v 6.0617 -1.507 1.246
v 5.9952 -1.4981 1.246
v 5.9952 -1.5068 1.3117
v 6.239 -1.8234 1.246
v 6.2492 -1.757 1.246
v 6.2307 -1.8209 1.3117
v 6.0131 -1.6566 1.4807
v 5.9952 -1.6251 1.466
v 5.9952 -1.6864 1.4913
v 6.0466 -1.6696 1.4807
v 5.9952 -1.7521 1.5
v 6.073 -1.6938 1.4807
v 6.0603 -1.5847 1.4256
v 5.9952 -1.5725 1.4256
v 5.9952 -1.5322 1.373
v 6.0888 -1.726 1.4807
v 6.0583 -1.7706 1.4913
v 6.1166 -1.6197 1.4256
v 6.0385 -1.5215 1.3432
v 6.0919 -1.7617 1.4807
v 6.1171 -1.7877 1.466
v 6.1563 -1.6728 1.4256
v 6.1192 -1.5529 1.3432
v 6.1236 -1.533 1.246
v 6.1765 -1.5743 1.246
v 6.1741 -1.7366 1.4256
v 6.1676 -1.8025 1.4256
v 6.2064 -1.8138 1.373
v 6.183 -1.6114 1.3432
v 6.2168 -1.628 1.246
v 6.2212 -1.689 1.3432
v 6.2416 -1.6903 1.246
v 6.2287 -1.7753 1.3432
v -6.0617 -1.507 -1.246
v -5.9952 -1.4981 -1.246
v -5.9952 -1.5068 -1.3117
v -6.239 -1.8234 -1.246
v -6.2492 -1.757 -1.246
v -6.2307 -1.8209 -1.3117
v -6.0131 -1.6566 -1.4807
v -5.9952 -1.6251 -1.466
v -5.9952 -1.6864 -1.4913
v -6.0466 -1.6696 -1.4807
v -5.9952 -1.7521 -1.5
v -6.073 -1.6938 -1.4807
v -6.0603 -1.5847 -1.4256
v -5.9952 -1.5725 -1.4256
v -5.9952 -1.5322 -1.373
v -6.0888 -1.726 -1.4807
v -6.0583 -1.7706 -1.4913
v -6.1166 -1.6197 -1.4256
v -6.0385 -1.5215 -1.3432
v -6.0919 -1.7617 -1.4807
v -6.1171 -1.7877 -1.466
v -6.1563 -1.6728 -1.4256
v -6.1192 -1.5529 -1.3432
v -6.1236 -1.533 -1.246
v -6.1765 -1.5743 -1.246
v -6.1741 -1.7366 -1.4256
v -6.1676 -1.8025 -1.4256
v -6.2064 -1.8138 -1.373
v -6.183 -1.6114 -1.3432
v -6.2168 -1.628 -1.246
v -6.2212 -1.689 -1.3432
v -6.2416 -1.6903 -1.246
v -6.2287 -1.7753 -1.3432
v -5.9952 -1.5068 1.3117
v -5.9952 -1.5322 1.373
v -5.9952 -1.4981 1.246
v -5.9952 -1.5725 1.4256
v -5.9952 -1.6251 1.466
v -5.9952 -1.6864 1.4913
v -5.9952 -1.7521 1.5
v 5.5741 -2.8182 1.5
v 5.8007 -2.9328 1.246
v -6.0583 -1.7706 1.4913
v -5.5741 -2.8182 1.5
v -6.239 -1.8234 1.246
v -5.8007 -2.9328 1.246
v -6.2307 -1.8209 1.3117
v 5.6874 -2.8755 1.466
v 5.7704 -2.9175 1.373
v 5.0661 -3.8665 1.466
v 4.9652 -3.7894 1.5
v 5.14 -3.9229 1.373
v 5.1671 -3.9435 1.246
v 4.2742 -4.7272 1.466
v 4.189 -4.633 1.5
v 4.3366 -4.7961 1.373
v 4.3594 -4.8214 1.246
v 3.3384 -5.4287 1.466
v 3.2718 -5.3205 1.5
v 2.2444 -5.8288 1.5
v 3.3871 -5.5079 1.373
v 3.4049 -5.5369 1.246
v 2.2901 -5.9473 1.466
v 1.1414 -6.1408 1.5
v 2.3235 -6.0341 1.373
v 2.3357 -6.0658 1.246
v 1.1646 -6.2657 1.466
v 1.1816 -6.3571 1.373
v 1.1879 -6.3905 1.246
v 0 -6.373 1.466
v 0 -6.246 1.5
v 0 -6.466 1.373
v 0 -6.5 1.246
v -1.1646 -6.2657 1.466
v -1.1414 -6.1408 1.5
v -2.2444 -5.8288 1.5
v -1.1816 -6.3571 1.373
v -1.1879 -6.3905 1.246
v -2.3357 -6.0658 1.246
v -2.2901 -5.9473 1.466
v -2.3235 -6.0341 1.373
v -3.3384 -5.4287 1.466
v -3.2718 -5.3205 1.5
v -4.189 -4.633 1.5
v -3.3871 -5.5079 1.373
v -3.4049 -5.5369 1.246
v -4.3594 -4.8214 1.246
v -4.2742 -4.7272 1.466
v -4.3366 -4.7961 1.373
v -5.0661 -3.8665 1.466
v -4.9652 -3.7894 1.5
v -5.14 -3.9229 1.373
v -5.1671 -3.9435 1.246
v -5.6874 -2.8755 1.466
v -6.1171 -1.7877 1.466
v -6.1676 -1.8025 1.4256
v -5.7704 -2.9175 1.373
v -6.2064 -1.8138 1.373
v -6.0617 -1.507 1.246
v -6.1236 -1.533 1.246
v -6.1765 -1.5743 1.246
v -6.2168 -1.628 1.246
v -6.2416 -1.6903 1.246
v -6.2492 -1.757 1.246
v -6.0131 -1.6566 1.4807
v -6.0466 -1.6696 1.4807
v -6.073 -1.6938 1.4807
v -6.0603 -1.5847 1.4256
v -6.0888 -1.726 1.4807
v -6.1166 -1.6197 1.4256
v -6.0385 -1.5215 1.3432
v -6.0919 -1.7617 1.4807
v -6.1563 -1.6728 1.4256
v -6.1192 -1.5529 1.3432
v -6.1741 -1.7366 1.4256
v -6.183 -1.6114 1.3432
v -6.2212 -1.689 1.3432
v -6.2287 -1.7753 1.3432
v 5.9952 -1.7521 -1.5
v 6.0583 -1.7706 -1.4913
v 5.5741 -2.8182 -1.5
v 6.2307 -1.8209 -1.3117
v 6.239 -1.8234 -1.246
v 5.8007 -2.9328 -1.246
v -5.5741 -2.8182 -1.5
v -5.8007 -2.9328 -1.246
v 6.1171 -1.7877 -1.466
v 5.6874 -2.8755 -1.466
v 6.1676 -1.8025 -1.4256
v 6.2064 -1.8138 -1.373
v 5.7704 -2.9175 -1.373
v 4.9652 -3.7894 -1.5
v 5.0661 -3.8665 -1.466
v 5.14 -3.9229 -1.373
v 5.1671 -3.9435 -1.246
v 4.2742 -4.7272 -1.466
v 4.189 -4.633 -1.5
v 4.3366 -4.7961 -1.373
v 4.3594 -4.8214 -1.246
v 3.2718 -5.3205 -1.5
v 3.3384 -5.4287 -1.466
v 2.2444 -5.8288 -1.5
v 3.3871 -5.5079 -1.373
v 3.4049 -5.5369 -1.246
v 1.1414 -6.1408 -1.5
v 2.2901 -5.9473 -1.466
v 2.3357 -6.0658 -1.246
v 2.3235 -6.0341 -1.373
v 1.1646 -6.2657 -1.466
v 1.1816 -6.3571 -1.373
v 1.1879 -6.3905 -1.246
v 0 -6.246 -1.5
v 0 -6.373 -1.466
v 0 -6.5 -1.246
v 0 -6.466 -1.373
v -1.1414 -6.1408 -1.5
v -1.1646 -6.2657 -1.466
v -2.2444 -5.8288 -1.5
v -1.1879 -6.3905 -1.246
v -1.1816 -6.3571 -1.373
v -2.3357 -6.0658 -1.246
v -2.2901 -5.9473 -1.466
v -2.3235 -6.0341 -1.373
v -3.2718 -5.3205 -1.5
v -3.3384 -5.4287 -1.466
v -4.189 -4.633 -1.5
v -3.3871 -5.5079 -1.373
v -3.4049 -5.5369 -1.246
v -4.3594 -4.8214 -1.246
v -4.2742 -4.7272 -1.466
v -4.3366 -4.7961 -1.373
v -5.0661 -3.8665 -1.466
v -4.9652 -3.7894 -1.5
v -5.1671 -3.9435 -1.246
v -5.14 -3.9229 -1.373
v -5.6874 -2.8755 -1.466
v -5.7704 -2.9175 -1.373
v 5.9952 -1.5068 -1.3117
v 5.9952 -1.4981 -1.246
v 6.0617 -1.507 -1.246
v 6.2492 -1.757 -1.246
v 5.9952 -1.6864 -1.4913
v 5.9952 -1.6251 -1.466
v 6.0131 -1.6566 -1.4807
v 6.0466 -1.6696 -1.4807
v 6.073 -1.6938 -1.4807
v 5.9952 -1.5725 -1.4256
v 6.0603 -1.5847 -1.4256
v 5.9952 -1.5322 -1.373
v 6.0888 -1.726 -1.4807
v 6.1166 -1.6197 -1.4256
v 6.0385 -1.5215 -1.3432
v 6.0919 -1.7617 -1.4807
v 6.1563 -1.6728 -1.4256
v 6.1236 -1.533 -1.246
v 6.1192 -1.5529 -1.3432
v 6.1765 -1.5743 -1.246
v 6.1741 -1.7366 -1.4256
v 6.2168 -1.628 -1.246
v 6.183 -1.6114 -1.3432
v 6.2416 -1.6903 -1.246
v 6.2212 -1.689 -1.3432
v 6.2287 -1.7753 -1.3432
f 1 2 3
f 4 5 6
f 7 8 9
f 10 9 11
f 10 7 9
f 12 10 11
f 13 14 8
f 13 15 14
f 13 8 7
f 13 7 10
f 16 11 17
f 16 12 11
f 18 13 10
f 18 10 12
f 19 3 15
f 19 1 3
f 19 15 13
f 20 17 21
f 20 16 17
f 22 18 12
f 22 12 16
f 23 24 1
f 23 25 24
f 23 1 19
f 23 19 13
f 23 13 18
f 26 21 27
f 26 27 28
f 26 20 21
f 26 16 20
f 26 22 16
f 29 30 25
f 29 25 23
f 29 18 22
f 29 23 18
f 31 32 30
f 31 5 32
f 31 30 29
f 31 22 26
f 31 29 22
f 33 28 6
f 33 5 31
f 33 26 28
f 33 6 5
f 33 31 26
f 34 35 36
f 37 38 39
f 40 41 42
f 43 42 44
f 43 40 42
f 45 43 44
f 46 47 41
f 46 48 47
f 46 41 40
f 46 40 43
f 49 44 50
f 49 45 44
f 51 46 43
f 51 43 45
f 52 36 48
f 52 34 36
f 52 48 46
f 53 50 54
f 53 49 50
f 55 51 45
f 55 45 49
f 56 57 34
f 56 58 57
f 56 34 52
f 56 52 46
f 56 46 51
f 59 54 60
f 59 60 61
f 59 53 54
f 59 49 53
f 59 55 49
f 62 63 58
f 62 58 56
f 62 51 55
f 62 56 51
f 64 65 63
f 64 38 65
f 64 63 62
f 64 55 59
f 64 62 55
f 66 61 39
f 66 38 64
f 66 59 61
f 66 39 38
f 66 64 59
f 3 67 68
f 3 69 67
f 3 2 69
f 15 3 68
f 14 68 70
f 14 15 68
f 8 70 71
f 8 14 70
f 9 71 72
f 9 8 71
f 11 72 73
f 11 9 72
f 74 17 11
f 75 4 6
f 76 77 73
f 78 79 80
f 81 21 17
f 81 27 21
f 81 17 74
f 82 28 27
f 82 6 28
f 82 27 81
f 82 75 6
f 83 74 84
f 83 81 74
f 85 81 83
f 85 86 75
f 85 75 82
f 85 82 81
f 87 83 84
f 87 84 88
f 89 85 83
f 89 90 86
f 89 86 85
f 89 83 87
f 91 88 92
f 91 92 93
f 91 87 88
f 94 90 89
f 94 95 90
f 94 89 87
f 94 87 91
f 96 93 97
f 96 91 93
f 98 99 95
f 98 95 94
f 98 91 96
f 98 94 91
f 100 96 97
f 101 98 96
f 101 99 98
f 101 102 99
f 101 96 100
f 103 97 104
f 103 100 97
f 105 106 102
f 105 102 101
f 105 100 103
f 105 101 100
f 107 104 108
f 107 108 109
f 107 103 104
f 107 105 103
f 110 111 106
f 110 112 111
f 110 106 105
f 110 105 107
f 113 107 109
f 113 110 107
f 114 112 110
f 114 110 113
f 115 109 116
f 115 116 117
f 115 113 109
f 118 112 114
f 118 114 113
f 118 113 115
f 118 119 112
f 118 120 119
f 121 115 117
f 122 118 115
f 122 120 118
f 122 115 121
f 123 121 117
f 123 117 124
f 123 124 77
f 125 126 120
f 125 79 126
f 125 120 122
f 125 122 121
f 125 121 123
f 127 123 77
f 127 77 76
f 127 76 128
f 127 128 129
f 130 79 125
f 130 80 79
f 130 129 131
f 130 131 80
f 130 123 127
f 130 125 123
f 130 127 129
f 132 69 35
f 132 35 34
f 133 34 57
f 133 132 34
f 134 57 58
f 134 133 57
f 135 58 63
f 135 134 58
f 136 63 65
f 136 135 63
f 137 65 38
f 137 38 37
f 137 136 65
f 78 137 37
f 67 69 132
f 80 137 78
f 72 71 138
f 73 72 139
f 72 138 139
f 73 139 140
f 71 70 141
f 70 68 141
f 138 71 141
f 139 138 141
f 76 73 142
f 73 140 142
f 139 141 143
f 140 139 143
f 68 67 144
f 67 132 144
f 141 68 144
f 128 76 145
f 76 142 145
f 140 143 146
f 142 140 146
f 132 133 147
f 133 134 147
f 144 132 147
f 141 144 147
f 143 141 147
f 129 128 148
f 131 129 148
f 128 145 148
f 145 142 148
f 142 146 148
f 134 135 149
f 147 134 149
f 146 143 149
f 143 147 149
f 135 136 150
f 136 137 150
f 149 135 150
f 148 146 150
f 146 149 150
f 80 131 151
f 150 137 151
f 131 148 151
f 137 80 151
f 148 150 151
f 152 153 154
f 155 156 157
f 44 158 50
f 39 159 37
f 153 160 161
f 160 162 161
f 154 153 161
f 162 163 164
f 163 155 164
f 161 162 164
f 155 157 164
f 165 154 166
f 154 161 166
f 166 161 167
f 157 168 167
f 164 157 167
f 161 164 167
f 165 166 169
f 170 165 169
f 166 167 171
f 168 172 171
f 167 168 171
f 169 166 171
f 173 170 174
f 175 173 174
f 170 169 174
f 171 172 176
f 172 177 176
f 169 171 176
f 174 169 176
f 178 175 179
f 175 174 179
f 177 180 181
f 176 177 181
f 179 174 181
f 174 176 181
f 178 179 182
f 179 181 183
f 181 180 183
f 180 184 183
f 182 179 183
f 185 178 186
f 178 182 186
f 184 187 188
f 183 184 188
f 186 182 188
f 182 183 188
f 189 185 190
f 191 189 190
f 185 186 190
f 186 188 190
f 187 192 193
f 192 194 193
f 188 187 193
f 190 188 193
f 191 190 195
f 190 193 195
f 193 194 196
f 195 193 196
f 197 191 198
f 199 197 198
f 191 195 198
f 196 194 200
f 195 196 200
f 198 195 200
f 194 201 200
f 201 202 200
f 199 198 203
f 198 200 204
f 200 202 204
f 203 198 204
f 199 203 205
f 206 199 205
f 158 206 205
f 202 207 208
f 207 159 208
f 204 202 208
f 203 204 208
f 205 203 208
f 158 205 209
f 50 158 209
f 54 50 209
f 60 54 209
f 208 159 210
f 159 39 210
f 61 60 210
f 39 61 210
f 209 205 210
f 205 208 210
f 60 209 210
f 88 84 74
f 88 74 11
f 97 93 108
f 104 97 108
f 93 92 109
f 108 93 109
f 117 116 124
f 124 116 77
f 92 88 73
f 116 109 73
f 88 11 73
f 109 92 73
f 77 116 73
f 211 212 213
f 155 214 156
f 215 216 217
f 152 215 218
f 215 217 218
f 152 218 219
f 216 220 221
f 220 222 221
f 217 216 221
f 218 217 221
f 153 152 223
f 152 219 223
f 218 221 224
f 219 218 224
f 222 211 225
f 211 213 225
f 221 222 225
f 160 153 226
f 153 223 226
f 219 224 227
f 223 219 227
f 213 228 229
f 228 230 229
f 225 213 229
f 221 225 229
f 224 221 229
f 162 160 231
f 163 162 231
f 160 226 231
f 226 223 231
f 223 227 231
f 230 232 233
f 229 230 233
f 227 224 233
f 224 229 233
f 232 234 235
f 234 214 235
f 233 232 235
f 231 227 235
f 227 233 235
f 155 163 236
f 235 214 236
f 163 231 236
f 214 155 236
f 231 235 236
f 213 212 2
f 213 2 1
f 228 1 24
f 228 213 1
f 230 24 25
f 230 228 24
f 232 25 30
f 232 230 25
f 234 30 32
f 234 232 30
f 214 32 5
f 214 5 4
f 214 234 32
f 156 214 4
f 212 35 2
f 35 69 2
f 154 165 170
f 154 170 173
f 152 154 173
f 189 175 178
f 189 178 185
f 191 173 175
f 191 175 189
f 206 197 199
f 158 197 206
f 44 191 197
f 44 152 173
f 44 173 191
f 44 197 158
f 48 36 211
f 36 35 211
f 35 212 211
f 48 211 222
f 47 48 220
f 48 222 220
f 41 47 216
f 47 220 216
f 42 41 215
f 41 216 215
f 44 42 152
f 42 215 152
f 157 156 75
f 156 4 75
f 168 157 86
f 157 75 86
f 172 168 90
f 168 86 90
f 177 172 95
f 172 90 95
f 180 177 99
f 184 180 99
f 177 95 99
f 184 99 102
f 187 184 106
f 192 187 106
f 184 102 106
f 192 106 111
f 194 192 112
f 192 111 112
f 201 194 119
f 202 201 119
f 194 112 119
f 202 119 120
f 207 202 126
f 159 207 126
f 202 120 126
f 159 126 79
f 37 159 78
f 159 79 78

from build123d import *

# Parameters (mm, degrees)
EXTRUDE1_DEPTH = 1.5
FILLET1_R      = 0.254


with BuildPart() as part:
    # Sketch1 → Extrude1 (new body, symmetric)
    with BuildSketch(Plane.XY):
        with BuildLine():
            Line((-6.325, -1.498123827), (6.325, -1.498123827))
            ThreePointArc((6.325, -1.498123827), (0, -6.5), (-6.325, -1.498123827))
        make_face()
    extrude(amount=EXTRUDE1_DEPTH, both=True)

    # Fillet1
    fillet1_edges = [part.edges().sort_by_distance(p)[0] for p in [
        (0, -1.498123827, -1.5),
        (0, -6.5, -1.5),
        (0, -6.5, 1.5),
        (-6.325, -1.498123827, 0),
        (6.325, -1.498123827, 0),
        (0, -1.498123827, 1.5),
    ]]
    fillet(fillet1_edges, radius=FILLET1_R)


solid = part.part
